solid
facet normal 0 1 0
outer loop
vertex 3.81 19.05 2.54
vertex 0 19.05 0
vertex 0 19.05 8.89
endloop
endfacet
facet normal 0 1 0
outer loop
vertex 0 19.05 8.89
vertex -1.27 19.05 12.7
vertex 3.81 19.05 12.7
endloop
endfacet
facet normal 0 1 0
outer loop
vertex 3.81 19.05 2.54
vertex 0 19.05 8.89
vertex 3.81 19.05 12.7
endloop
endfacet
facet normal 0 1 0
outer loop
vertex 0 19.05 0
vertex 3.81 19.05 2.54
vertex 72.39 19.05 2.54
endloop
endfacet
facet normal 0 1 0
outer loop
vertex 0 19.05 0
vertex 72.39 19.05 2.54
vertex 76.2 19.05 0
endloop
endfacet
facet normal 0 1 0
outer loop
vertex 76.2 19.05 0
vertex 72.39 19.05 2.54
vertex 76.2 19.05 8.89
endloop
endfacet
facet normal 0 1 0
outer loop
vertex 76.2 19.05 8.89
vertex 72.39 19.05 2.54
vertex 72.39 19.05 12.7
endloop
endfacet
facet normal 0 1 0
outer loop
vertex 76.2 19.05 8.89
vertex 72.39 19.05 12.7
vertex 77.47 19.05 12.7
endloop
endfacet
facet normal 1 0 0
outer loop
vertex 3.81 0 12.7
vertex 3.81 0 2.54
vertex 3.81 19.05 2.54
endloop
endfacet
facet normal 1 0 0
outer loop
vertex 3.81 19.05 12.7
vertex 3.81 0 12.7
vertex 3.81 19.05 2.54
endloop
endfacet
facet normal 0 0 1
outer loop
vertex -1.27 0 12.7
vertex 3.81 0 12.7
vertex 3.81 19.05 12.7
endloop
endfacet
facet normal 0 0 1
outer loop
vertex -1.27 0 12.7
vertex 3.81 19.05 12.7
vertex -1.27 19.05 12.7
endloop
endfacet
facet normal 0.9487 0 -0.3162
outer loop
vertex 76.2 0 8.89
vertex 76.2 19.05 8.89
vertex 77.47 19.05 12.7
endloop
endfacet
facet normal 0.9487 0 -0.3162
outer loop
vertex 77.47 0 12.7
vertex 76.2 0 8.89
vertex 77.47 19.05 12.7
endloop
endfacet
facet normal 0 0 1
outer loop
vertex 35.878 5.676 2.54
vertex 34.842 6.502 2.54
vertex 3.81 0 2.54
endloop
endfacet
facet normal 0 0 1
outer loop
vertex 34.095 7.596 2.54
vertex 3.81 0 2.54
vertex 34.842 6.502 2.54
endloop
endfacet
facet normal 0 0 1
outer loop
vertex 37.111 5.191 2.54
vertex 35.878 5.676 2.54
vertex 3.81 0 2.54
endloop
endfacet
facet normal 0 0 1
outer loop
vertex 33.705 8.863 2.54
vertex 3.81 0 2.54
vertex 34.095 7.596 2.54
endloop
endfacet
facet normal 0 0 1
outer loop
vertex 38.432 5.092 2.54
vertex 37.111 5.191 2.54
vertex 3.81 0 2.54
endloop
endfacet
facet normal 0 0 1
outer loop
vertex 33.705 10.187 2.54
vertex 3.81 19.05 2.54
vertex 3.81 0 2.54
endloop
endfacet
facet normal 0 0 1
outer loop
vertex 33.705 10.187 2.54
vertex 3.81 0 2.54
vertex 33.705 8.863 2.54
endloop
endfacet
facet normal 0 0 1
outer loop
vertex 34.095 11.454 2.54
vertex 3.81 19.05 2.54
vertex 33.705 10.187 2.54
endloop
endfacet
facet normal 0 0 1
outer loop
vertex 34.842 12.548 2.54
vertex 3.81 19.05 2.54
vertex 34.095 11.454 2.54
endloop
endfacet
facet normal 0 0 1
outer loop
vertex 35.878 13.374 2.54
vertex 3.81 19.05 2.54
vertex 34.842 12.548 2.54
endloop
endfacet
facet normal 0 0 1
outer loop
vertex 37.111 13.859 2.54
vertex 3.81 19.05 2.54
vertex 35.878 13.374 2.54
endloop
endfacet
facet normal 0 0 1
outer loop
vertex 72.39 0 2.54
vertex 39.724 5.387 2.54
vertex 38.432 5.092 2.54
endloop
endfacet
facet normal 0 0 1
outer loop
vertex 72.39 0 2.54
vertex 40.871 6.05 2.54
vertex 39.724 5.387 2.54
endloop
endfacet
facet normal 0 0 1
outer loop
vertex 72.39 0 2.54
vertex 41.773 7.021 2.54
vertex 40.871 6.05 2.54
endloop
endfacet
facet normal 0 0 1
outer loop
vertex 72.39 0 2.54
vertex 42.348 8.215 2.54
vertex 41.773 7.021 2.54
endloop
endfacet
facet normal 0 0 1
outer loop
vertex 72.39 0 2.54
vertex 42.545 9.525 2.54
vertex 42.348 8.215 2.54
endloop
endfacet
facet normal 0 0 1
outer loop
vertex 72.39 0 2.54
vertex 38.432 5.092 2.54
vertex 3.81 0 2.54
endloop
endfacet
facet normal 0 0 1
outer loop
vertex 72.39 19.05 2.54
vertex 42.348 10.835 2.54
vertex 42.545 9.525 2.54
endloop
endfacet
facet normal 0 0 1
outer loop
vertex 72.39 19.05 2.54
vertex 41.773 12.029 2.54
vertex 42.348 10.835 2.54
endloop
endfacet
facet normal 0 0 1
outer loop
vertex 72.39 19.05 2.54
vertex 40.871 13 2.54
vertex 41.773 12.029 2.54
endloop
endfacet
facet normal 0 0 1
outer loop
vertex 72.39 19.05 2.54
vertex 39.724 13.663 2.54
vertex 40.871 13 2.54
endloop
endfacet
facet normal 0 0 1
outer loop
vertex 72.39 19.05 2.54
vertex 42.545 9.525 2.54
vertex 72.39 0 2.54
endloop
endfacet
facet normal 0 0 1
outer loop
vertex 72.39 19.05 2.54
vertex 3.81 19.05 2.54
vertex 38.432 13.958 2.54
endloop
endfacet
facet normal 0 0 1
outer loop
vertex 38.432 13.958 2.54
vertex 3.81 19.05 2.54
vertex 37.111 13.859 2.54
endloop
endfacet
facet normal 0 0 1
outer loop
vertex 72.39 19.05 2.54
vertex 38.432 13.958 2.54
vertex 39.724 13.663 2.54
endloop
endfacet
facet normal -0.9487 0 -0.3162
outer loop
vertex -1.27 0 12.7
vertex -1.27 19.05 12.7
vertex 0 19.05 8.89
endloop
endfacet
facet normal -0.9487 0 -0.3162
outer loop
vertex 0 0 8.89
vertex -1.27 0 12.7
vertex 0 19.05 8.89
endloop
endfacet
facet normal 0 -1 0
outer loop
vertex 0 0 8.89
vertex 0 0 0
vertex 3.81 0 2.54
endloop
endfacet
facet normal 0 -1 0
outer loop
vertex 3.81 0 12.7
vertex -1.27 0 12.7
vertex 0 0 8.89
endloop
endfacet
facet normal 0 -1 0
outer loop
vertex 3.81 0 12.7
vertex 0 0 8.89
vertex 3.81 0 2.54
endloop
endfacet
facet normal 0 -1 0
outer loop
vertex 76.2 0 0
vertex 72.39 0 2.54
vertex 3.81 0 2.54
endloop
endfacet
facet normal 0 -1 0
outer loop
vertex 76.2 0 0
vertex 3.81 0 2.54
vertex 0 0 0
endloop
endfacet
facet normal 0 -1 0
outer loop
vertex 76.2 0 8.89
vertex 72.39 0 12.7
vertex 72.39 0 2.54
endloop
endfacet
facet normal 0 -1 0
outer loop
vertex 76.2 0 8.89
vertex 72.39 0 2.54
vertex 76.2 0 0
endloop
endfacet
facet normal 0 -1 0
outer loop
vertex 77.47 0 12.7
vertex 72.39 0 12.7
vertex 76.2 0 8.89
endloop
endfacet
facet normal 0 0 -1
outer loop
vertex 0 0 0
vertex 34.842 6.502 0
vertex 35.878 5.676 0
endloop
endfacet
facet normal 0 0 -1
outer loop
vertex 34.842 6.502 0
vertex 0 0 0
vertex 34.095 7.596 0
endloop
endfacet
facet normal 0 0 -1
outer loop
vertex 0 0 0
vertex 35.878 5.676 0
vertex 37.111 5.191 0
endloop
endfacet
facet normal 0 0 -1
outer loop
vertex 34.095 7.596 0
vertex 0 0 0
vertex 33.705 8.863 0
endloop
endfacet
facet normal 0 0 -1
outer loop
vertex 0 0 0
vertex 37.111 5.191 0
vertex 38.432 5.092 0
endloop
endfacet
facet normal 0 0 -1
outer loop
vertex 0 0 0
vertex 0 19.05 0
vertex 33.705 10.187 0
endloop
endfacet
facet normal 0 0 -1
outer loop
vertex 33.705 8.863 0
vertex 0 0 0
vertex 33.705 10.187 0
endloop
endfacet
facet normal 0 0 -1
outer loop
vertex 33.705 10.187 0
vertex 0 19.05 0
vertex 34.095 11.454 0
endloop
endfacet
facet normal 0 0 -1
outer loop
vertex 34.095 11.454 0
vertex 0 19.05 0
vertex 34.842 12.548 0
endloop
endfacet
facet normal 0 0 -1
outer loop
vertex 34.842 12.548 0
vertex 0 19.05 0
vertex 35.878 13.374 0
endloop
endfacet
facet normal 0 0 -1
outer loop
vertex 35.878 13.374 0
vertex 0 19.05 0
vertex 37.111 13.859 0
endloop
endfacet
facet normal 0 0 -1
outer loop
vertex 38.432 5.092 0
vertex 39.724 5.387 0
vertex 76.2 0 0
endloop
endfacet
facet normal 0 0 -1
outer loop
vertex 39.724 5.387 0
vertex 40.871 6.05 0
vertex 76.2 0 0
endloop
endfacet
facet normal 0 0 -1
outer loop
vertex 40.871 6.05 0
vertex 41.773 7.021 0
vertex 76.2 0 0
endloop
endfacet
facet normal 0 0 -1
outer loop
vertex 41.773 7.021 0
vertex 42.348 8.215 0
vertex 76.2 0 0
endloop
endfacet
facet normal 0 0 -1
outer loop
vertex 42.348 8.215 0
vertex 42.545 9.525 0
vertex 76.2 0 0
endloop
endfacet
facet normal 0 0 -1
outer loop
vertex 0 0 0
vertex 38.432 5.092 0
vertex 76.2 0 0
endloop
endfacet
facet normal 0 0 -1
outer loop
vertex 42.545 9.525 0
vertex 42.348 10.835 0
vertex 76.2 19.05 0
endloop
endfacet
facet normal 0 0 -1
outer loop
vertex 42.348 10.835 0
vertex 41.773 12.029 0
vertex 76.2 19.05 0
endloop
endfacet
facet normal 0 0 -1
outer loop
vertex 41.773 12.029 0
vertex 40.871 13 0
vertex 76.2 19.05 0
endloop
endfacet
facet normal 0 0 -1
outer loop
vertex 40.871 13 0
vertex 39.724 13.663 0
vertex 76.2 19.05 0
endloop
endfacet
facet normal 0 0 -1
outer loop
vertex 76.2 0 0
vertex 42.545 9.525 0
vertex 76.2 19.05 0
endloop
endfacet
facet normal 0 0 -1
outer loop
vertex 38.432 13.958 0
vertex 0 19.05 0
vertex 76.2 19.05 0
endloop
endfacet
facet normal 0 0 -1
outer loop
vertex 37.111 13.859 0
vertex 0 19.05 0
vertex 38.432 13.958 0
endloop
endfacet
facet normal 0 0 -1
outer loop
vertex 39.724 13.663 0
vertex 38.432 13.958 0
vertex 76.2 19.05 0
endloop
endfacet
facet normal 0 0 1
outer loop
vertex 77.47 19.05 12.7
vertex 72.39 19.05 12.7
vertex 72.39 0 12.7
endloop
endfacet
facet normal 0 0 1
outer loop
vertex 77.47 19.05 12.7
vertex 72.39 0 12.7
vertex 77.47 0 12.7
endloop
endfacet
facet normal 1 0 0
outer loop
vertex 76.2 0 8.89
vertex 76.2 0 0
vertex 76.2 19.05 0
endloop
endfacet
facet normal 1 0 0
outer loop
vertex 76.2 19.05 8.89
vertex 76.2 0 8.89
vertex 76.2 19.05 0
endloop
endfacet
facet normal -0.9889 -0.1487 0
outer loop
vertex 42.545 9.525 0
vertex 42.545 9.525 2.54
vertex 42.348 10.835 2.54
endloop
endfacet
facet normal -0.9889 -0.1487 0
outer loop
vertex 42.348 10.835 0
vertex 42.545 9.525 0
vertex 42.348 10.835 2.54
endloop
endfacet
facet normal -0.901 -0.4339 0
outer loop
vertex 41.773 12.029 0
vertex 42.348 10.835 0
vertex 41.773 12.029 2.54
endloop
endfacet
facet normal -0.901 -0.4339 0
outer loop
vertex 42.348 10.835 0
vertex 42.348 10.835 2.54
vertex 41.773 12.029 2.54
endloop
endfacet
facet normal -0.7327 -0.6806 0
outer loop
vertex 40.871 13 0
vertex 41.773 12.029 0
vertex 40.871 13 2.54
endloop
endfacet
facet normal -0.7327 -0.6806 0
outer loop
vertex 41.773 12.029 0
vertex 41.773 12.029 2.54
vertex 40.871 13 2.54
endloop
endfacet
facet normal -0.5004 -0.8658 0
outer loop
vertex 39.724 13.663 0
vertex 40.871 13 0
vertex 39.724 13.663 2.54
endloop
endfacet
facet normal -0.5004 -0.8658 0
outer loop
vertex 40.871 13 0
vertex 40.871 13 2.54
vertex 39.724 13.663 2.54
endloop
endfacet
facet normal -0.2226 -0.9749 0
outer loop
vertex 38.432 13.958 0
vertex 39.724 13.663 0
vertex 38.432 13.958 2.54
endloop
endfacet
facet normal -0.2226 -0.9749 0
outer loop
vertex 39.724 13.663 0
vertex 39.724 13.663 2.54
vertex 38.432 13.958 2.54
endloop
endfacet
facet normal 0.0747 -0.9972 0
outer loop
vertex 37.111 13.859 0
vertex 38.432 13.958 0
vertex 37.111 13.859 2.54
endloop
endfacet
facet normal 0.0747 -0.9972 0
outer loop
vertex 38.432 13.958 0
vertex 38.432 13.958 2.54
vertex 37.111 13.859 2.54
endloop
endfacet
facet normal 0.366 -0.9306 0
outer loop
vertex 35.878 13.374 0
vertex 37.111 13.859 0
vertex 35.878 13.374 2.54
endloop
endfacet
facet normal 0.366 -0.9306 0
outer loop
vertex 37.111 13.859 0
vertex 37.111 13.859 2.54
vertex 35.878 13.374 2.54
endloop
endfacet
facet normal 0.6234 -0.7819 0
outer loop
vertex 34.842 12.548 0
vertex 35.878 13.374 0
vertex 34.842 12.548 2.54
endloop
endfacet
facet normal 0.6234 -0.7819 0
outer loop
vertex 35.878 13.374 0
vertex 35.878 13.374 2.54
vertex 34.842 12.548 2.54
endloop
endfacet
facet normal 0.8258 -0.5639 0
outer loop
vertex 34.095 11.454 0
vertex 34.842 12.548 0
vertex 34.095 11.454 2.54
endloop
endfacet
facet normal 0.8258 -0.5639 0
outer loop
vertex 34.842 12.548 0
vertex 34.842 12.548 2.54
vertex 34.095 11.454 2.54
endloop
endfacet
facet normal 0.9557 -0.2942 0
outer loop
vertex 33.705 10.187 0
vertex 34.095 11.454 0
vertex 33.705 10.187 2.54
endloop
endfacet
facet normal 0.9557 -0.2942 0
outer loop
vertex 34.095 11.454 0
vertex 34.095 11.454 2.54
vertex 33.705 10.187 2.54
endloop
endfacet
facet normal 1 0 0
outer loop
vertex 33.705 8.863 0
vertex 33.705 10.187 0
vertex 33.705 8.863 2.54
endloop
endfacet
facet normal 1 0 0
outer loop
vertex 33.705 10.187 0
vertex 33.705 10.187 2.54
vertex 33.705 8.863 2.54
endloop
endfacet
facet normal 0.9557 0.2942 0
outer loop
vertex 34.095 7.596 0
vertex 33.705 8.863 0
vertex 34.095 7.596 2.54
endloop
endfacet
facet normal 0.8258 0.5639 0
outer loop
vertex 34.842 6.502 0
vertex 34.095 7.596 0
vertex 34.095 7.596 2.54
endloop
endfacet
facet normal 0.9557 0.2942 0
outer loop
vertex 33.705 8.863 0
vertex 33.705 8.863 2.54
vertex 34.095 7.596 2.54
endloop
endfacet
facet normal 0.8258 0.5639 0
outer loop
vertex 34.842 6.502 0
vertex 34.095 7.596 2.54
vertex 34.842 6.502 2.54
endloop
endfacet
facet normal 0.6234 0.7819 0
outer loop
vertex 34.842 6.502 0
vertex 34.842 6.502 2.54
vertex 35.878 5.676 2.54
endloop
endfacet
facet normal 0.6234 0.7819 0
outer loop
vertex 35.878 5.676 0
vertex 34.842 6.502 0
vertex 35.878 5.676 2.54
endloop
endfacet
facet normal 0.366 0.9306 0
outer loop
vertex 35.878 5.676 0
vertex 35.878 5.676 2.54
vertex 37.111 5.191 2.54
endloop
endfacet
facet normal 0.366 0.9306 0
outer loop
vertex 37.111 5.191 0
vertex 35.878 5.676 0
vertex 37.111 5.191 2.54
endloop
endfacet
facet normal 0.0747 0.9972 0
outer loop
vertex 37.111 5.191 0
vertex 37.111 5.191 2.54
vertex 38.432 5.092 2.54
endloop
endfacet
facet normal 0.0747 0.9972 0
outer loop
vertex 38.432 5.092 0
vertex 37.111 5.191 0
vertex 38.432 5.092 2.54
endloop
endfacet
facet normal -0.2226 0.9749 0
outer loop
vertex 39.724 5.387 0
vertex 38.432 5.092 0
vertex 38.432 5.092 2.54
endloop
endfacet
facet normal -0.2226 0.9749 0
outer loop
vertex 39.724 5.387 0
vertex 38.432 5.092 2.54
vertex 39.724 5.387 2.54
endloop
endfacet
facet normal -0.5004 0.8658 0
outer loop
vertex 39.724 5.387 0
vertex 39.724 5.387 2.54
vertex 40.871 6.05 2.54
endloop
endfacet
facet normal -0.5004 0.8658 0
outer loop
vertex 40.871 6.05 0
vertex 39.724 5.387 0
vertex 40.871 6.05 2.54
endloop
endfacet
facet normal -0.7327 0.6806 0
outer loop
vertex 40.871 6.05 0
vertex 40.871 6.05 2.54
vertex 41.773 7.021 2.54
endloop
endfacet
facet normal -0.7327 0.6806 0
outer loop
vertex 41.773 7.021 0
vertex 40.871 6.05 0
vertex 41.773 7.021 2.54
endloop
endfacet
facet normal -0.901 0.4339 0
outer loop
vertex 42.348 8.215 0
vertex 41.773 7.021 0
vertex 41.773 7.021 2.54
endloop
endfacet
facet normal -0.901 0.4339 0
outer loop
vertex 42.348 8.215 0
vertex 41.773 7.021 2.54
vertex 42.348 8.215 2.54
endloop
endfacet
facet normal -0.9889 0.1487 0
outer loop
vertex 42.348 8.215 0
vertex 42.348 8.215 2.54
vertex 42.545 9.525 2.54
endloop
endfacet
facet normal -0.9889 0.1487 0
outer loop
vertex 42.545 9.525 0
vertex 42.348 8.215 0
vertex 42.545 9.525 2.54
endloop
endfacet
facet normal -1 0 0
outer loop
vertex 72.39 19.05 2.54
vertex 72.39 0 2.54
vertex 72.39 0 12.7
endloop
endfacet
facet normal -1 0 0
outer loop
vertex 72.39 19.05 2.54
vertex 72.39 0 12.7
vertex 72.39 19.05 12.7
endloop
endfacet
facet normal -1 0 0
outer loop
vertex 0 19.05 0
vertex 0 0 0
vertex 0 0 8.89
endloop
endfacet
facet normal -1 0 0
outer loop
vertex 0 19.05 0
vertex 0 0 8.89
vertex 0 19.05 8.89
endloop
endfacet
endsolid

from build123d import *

# Parameters (mm, degrees)
F0_W     = 76.2
F0_H     = 19.05
F1_DEPTH = 2.54
F2_W     = 3.81
F2_H     = 19.05
F3_DEPTH = 10.16
F4_R     = 4.445
F5_DEPTH = 25.4
F7_DEPTH = 19.05


with BuildPart() as f1:
    # F0 (on Top) → F1 (new body)
    with BuildSketch(Plane.XY):
        with Locations((38.1, 9.525)):
            Rectangle(F0_W, F0_H)
    extrude(amount=F1_DEPTH)

    # F2 (on face) → F3 (join)
    with BuildSketch(Plane.XY.offset(2.54)):
        with Locations((1.905, 9.525)):
            Rectangle(F2_W, F2_H)
        with Locations((74.295, 9.525)):
            Rectangle(F2_W, F2_H)
    extrude(amount=F3_DEPTH)

    # F4 (on face) → F5 (cut)
    with BuildSketch(Plane.XY.offset(2.54)):
        with Locations((38.1, 9.525)):
            Circle(F4_R)
    extrude(amount=-F5_DEPTH, mode=Mode.SUBTRACT)

    # F6 (on face) → F7 (join, through all)
    with BuildSketch(Plane.XZ):
        Polygon((0, 8.89), (0, 12.7), (-1.27, 12.7), align=None)
        Polygon((76.2, 12.7), (76.2, 8.89), (77.47, 12.7), align=None)
    extrude(amount=-F7_DEPTH)


solid = f1.part
